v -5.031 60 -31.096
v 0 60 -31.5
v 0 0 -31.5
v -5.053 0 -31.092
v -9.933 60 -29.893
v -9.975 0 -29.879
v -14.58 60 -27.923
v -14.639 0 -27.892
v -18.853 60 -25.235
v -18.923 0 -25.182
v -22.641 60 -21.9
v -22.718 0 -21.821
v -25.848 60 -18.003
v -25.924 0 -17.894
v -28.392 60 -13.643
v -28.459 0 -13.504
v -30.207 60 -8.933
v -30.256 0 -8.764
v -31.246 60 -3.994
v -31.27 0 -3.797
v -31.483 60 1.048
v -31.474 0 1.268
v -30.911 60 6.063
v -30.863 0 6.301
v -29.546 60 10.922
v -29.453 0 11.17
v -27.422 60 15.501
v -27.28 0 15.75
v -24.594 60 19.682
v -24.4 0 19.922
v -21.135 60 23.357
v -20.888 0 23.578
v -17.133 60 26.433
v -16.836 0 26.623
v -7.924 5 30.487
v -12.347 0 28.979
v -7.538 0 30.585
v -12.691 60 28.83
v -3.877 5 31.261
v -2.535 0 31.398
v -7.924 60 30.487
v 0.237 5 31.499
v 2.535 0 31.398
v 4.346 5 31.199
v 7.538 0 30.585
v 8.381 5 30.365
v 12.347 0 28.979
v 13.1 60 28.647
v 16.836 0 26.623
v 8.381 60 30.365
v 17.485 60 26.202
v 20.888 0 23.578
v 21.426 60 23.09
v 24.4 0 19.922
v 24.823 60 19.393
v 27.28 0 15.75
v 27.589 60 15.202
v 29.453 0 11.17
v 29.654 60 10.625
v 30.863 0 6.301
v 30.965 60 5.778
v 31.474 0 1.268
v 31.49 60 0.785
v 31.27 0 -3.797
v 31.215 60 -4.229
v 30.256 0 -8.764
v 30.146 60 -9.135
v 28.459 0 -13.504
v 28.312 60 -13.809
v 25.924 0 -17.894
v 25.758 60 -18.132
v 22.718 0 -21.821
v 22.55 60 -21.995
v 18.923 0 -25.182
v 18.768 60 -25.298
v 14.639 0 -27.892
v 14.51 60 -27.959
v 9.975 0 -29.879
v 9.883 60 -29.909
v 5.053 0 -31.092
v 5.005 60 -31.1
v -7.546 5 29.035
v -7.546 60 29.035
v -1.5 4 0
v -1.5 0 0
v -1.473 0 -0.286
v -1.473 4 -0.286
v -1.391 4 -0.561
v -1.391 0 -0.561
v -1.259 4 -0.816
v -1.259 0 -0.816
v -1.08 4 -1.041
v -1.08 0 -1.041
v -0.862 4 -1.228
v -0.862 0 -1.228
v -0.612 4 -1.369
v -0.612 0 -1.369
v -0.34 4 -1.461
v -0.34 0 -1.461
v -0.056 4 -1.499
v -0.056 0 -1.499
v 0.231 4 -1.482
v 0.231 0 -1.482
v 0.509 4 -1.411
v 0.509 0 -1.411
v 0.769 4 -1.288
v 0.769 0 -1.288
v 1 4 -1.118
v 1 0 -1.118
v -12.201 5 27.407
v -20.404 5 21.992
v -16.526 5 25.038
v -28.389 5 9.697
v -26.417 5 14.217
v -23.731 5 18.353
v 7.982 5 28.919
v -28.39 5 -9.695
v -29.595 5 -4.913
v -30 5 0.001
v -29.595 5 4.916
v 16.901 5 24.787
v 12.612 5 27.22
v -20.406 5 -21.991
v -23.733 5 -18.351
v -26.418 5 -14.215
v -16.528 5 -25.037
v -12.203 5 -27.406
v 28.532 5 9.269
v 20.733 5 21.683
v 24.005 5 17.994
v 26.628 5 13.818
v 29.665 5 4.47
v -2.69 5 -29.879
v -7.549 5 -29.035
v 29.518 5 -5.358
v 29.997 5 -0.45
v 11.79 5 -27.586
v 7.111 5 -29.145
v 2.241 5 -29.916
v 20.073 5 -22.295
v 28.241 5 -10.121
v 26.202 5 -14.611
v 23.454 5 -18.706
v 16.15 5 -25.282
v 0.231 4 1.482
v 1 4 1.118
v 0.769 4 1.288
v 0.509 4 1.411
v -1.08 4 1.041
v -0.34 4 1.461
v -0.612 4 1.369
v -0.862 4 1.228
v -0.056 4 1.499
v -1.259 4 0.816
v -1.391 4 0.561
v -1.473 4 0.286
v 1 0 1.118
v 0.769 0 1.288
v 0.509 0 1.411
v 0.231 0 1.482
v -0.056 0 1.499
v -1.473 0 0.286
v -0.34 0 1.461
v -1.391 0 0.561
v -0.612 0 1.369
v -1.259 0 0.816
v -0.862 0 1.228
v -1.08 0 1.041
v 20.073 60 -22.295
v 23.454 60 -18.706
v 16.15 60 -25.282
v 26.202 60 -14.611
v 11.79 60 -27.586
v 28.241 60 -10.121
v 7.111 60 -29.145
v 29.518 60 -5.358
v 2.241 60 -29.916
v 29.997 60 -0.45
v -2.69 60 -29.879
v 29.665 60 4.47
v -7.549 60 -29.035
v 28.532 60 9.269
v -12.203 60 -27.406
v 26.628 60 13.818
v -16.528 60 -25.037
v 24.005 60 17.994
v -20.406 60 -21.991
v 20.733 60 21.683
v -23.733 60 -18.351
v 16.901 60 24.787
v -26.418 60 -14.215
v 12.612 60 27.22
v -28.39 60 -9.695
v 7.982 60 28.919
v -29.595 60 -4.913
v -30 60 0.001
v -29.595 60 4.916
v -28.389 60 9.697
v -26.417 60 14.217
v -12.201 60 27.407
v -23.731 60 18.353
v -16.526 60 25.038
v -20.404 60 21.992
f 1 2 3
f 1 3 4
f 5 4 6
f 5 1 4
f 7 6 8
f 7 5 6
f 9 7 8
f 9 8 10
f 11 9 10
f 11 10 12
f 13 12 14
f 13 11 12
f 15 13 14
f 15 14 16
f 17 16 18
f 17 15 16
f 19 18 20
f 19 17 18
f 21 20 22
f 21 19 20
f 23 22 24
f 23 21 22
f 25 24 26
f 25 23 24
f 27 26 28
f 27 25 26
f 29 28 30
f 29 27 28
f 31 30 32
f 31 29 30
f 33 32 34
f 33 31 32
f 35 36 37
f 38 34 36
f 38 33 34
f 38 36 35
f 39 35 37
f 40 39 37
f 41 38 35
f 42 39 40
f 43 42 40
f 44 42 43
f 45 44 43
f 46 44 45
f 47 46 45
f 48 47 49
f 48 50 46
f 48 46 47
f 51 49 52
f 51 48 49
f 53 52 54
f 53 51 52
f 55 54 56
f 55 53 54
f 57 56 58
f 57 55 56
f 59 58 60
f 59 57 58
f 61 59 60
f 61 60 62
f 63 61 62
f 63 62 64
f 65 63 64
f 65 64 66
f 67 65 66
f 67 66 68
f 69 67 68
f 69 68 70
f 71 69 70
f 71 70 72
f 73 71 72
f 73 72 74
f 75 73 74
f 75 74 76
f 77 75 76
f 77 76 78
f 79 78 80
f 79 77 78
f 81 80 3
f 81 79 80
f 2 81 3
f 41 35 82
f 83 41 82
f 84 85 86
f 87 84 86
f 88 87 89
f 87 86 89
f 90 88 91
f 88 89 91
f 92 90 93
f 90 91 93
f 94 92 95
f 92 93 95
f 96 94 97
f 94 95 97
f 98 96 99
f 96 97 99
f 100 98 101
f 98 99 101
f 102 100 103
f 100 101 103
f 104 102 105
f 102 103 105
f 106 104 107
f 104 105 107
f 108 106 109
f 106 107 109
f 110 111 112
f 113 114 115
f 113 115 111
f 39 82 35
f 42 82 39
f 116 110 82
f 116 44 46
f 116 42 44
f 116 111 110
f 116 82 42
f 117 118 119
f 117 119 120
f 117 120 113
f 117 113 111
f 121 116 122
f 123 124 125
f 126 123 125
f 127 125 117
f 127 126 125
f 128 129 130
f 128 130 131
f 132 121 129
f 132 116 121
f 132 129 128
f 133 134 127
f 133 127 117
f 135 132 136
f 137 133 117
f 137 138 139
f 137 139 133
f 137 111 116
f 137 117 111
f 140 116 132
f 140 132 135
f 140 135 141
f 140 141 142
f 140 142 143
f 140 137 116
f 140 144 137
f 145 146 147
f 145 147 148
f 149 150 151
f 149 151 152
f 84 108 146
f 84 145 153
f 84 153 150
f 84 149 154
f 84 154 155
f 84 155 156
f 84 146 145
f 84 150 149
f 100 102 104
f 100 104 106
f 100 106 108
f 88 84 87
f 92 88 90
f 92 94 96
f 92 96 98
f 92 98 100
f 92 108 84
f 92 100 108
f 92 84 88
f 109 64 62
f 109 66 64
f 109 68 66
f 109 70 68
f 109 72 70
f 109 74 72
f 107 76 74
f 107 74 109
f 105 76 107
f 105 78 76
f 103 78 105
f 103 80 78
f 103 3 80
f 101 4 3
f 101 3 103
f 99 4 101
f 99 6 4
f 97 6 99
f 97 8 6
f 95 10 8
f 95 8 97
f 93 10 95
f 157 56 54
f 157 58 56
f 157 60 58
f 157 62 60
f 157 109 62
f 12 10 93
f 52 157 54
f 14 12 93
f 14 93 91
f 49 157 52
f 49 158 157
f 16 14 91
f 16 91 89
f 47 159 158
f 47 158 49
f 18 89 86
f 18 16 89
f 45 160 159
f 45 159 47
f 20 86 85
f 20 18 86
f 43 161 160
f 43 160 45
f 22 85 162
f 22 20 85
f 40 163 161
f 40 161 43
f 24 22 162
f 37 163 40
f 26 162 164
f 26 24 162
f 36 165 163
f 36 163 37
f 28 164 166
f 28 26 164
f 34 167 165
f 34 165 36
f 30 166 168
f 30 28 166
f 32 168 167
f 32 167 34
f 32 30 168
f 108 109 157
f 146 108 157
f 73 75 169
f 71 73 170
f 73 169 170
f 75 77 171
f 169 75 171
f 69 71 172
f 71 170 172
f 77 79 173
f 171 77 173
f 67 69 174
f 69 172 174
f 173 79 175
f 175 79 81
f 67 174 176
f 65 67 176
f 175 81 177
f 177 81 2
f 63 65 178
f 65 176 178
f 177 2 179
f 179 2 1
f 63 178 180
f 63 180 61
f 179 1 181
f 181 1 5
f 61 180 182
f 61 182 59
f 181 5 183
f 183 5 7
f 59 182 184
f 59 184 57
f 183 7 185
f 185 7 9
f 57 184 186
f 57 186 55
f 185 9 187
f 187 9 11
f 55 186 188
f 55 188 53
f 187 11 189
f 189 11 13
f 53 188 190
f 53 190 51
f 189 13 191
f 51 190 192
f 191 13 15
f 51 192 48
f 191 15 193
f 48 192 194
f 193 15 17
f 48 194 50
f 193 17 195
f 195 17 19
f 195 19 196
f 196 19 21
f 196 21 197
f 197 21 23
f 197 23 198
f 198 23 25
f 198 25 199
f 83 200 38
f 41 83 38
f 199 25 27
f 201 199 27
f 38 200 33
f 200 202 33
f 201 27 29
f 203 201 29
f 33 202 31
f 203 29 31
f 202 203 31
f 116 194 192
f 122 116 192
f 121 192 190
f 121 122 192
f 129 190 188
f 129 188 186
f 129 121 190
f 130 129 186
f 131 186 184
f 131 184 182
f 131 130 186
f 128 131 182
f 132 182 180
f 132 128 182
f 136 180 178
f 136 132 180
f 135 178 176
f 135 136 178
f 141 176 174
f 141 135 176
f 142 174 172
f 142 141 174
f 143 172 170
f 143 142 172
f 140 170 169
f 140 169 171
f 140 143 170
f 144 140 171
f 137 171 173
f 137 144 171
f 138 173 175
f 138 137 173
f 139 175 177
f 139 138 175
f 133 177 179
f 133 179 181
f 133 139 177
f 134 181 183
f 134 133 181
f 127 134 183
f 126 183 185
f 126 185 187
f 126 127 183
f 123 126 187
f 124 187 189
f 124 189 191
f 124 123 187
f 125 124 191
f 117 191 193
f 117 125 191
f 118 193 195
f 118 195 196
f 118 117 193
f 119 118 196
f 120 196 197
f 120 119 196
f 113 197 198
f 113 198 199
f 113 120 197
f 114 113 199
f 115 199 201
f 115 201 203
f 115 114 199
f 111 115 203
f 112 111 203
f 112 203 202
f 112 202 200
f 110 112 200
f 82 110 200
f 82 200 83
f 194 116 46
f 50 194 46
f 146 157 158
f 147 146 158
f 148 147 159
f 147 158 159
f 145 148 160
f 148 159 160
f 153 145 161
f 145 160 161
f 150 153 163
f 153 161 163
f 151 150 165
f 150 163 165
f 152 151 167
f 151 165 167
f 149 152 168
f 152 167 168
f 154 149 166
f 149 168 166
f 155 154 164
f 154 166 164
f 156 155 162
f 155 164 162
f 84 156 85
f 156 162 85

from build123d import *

# Parameters (mm, degrees)
ESQUISSE1_W             = 31.5
ESQUISSE1_H             = 60
ENL_V_START             = -55
ESQUISSE2_R             = 30
ENL_V_MAT_EXTRU_4_DEPTH = 55
ENL_V_MAT_EXTRU_7_DEPTH = 4


with BuildPart() as part:
    # Esquisse1 → Révolution1 (revolve)
    with BuildSketch(Plane.XY, mode=Mode.PRIVATE) as r_volution1_sk:
        with Locations((15.75, 30)):
            Rectangle(ESQUISSE1_W, ESQUISSE1_H)
    revolve(r_volution1_sk.sketch.rotate(Axis((0, 0, 0), (0, 1, 0)), 90), axis=Axis((0, 0, 0), (0, 1, 0)))

    # Esquisse2 → Enlèv. mat.-Extru.4 (cut)
    with BuildSketch(Plane(origin=(0, 60, 0), x_dir=(1, 0, 0), z_dir=(0, 1, 0)).offset(ENL_V_START)):
        Circle(ESQUISSE2_R)
        with BuildLine():
            Line((-7.923821592, -30.487096473), (0, 0))
            Line((0, 0), (8.381317443, -30.36451083))
            ThreePointArc((8.381317443, -30.36451083), (0.236817278, -31.49910979), (-7.923821592, -30.487096473))
        make_face()
    extrude(amount=ENL_V_MAT_EXTRU_4_DEPTH, mode=Mode.SUBTRACT)

    # Esquisse4 → Enlèv. mat.-Extru.7 (cut)
    with BuildSketch(Plane(origin=(0, 0, 0), x_dir=(-1, 0, 0), z_dir=(0, -1, 0))):
        with BuildLine():
            Line((-1, 1.118033989), (-1, -1.118033989))
            ThreePointArc((-1, -1.118033989), (0.612372436, -1.369306394), (1.5, 0))
            ThreePointArc((1.5, 0), (0.612372436, 1.369306394), (-1, 1.118033989))
        make_face()
    extrude(amount=-ENL_V_MAT_EXTRU_7_DEPTH, mode=Mode.SUBTRACT)


solid = part.part
